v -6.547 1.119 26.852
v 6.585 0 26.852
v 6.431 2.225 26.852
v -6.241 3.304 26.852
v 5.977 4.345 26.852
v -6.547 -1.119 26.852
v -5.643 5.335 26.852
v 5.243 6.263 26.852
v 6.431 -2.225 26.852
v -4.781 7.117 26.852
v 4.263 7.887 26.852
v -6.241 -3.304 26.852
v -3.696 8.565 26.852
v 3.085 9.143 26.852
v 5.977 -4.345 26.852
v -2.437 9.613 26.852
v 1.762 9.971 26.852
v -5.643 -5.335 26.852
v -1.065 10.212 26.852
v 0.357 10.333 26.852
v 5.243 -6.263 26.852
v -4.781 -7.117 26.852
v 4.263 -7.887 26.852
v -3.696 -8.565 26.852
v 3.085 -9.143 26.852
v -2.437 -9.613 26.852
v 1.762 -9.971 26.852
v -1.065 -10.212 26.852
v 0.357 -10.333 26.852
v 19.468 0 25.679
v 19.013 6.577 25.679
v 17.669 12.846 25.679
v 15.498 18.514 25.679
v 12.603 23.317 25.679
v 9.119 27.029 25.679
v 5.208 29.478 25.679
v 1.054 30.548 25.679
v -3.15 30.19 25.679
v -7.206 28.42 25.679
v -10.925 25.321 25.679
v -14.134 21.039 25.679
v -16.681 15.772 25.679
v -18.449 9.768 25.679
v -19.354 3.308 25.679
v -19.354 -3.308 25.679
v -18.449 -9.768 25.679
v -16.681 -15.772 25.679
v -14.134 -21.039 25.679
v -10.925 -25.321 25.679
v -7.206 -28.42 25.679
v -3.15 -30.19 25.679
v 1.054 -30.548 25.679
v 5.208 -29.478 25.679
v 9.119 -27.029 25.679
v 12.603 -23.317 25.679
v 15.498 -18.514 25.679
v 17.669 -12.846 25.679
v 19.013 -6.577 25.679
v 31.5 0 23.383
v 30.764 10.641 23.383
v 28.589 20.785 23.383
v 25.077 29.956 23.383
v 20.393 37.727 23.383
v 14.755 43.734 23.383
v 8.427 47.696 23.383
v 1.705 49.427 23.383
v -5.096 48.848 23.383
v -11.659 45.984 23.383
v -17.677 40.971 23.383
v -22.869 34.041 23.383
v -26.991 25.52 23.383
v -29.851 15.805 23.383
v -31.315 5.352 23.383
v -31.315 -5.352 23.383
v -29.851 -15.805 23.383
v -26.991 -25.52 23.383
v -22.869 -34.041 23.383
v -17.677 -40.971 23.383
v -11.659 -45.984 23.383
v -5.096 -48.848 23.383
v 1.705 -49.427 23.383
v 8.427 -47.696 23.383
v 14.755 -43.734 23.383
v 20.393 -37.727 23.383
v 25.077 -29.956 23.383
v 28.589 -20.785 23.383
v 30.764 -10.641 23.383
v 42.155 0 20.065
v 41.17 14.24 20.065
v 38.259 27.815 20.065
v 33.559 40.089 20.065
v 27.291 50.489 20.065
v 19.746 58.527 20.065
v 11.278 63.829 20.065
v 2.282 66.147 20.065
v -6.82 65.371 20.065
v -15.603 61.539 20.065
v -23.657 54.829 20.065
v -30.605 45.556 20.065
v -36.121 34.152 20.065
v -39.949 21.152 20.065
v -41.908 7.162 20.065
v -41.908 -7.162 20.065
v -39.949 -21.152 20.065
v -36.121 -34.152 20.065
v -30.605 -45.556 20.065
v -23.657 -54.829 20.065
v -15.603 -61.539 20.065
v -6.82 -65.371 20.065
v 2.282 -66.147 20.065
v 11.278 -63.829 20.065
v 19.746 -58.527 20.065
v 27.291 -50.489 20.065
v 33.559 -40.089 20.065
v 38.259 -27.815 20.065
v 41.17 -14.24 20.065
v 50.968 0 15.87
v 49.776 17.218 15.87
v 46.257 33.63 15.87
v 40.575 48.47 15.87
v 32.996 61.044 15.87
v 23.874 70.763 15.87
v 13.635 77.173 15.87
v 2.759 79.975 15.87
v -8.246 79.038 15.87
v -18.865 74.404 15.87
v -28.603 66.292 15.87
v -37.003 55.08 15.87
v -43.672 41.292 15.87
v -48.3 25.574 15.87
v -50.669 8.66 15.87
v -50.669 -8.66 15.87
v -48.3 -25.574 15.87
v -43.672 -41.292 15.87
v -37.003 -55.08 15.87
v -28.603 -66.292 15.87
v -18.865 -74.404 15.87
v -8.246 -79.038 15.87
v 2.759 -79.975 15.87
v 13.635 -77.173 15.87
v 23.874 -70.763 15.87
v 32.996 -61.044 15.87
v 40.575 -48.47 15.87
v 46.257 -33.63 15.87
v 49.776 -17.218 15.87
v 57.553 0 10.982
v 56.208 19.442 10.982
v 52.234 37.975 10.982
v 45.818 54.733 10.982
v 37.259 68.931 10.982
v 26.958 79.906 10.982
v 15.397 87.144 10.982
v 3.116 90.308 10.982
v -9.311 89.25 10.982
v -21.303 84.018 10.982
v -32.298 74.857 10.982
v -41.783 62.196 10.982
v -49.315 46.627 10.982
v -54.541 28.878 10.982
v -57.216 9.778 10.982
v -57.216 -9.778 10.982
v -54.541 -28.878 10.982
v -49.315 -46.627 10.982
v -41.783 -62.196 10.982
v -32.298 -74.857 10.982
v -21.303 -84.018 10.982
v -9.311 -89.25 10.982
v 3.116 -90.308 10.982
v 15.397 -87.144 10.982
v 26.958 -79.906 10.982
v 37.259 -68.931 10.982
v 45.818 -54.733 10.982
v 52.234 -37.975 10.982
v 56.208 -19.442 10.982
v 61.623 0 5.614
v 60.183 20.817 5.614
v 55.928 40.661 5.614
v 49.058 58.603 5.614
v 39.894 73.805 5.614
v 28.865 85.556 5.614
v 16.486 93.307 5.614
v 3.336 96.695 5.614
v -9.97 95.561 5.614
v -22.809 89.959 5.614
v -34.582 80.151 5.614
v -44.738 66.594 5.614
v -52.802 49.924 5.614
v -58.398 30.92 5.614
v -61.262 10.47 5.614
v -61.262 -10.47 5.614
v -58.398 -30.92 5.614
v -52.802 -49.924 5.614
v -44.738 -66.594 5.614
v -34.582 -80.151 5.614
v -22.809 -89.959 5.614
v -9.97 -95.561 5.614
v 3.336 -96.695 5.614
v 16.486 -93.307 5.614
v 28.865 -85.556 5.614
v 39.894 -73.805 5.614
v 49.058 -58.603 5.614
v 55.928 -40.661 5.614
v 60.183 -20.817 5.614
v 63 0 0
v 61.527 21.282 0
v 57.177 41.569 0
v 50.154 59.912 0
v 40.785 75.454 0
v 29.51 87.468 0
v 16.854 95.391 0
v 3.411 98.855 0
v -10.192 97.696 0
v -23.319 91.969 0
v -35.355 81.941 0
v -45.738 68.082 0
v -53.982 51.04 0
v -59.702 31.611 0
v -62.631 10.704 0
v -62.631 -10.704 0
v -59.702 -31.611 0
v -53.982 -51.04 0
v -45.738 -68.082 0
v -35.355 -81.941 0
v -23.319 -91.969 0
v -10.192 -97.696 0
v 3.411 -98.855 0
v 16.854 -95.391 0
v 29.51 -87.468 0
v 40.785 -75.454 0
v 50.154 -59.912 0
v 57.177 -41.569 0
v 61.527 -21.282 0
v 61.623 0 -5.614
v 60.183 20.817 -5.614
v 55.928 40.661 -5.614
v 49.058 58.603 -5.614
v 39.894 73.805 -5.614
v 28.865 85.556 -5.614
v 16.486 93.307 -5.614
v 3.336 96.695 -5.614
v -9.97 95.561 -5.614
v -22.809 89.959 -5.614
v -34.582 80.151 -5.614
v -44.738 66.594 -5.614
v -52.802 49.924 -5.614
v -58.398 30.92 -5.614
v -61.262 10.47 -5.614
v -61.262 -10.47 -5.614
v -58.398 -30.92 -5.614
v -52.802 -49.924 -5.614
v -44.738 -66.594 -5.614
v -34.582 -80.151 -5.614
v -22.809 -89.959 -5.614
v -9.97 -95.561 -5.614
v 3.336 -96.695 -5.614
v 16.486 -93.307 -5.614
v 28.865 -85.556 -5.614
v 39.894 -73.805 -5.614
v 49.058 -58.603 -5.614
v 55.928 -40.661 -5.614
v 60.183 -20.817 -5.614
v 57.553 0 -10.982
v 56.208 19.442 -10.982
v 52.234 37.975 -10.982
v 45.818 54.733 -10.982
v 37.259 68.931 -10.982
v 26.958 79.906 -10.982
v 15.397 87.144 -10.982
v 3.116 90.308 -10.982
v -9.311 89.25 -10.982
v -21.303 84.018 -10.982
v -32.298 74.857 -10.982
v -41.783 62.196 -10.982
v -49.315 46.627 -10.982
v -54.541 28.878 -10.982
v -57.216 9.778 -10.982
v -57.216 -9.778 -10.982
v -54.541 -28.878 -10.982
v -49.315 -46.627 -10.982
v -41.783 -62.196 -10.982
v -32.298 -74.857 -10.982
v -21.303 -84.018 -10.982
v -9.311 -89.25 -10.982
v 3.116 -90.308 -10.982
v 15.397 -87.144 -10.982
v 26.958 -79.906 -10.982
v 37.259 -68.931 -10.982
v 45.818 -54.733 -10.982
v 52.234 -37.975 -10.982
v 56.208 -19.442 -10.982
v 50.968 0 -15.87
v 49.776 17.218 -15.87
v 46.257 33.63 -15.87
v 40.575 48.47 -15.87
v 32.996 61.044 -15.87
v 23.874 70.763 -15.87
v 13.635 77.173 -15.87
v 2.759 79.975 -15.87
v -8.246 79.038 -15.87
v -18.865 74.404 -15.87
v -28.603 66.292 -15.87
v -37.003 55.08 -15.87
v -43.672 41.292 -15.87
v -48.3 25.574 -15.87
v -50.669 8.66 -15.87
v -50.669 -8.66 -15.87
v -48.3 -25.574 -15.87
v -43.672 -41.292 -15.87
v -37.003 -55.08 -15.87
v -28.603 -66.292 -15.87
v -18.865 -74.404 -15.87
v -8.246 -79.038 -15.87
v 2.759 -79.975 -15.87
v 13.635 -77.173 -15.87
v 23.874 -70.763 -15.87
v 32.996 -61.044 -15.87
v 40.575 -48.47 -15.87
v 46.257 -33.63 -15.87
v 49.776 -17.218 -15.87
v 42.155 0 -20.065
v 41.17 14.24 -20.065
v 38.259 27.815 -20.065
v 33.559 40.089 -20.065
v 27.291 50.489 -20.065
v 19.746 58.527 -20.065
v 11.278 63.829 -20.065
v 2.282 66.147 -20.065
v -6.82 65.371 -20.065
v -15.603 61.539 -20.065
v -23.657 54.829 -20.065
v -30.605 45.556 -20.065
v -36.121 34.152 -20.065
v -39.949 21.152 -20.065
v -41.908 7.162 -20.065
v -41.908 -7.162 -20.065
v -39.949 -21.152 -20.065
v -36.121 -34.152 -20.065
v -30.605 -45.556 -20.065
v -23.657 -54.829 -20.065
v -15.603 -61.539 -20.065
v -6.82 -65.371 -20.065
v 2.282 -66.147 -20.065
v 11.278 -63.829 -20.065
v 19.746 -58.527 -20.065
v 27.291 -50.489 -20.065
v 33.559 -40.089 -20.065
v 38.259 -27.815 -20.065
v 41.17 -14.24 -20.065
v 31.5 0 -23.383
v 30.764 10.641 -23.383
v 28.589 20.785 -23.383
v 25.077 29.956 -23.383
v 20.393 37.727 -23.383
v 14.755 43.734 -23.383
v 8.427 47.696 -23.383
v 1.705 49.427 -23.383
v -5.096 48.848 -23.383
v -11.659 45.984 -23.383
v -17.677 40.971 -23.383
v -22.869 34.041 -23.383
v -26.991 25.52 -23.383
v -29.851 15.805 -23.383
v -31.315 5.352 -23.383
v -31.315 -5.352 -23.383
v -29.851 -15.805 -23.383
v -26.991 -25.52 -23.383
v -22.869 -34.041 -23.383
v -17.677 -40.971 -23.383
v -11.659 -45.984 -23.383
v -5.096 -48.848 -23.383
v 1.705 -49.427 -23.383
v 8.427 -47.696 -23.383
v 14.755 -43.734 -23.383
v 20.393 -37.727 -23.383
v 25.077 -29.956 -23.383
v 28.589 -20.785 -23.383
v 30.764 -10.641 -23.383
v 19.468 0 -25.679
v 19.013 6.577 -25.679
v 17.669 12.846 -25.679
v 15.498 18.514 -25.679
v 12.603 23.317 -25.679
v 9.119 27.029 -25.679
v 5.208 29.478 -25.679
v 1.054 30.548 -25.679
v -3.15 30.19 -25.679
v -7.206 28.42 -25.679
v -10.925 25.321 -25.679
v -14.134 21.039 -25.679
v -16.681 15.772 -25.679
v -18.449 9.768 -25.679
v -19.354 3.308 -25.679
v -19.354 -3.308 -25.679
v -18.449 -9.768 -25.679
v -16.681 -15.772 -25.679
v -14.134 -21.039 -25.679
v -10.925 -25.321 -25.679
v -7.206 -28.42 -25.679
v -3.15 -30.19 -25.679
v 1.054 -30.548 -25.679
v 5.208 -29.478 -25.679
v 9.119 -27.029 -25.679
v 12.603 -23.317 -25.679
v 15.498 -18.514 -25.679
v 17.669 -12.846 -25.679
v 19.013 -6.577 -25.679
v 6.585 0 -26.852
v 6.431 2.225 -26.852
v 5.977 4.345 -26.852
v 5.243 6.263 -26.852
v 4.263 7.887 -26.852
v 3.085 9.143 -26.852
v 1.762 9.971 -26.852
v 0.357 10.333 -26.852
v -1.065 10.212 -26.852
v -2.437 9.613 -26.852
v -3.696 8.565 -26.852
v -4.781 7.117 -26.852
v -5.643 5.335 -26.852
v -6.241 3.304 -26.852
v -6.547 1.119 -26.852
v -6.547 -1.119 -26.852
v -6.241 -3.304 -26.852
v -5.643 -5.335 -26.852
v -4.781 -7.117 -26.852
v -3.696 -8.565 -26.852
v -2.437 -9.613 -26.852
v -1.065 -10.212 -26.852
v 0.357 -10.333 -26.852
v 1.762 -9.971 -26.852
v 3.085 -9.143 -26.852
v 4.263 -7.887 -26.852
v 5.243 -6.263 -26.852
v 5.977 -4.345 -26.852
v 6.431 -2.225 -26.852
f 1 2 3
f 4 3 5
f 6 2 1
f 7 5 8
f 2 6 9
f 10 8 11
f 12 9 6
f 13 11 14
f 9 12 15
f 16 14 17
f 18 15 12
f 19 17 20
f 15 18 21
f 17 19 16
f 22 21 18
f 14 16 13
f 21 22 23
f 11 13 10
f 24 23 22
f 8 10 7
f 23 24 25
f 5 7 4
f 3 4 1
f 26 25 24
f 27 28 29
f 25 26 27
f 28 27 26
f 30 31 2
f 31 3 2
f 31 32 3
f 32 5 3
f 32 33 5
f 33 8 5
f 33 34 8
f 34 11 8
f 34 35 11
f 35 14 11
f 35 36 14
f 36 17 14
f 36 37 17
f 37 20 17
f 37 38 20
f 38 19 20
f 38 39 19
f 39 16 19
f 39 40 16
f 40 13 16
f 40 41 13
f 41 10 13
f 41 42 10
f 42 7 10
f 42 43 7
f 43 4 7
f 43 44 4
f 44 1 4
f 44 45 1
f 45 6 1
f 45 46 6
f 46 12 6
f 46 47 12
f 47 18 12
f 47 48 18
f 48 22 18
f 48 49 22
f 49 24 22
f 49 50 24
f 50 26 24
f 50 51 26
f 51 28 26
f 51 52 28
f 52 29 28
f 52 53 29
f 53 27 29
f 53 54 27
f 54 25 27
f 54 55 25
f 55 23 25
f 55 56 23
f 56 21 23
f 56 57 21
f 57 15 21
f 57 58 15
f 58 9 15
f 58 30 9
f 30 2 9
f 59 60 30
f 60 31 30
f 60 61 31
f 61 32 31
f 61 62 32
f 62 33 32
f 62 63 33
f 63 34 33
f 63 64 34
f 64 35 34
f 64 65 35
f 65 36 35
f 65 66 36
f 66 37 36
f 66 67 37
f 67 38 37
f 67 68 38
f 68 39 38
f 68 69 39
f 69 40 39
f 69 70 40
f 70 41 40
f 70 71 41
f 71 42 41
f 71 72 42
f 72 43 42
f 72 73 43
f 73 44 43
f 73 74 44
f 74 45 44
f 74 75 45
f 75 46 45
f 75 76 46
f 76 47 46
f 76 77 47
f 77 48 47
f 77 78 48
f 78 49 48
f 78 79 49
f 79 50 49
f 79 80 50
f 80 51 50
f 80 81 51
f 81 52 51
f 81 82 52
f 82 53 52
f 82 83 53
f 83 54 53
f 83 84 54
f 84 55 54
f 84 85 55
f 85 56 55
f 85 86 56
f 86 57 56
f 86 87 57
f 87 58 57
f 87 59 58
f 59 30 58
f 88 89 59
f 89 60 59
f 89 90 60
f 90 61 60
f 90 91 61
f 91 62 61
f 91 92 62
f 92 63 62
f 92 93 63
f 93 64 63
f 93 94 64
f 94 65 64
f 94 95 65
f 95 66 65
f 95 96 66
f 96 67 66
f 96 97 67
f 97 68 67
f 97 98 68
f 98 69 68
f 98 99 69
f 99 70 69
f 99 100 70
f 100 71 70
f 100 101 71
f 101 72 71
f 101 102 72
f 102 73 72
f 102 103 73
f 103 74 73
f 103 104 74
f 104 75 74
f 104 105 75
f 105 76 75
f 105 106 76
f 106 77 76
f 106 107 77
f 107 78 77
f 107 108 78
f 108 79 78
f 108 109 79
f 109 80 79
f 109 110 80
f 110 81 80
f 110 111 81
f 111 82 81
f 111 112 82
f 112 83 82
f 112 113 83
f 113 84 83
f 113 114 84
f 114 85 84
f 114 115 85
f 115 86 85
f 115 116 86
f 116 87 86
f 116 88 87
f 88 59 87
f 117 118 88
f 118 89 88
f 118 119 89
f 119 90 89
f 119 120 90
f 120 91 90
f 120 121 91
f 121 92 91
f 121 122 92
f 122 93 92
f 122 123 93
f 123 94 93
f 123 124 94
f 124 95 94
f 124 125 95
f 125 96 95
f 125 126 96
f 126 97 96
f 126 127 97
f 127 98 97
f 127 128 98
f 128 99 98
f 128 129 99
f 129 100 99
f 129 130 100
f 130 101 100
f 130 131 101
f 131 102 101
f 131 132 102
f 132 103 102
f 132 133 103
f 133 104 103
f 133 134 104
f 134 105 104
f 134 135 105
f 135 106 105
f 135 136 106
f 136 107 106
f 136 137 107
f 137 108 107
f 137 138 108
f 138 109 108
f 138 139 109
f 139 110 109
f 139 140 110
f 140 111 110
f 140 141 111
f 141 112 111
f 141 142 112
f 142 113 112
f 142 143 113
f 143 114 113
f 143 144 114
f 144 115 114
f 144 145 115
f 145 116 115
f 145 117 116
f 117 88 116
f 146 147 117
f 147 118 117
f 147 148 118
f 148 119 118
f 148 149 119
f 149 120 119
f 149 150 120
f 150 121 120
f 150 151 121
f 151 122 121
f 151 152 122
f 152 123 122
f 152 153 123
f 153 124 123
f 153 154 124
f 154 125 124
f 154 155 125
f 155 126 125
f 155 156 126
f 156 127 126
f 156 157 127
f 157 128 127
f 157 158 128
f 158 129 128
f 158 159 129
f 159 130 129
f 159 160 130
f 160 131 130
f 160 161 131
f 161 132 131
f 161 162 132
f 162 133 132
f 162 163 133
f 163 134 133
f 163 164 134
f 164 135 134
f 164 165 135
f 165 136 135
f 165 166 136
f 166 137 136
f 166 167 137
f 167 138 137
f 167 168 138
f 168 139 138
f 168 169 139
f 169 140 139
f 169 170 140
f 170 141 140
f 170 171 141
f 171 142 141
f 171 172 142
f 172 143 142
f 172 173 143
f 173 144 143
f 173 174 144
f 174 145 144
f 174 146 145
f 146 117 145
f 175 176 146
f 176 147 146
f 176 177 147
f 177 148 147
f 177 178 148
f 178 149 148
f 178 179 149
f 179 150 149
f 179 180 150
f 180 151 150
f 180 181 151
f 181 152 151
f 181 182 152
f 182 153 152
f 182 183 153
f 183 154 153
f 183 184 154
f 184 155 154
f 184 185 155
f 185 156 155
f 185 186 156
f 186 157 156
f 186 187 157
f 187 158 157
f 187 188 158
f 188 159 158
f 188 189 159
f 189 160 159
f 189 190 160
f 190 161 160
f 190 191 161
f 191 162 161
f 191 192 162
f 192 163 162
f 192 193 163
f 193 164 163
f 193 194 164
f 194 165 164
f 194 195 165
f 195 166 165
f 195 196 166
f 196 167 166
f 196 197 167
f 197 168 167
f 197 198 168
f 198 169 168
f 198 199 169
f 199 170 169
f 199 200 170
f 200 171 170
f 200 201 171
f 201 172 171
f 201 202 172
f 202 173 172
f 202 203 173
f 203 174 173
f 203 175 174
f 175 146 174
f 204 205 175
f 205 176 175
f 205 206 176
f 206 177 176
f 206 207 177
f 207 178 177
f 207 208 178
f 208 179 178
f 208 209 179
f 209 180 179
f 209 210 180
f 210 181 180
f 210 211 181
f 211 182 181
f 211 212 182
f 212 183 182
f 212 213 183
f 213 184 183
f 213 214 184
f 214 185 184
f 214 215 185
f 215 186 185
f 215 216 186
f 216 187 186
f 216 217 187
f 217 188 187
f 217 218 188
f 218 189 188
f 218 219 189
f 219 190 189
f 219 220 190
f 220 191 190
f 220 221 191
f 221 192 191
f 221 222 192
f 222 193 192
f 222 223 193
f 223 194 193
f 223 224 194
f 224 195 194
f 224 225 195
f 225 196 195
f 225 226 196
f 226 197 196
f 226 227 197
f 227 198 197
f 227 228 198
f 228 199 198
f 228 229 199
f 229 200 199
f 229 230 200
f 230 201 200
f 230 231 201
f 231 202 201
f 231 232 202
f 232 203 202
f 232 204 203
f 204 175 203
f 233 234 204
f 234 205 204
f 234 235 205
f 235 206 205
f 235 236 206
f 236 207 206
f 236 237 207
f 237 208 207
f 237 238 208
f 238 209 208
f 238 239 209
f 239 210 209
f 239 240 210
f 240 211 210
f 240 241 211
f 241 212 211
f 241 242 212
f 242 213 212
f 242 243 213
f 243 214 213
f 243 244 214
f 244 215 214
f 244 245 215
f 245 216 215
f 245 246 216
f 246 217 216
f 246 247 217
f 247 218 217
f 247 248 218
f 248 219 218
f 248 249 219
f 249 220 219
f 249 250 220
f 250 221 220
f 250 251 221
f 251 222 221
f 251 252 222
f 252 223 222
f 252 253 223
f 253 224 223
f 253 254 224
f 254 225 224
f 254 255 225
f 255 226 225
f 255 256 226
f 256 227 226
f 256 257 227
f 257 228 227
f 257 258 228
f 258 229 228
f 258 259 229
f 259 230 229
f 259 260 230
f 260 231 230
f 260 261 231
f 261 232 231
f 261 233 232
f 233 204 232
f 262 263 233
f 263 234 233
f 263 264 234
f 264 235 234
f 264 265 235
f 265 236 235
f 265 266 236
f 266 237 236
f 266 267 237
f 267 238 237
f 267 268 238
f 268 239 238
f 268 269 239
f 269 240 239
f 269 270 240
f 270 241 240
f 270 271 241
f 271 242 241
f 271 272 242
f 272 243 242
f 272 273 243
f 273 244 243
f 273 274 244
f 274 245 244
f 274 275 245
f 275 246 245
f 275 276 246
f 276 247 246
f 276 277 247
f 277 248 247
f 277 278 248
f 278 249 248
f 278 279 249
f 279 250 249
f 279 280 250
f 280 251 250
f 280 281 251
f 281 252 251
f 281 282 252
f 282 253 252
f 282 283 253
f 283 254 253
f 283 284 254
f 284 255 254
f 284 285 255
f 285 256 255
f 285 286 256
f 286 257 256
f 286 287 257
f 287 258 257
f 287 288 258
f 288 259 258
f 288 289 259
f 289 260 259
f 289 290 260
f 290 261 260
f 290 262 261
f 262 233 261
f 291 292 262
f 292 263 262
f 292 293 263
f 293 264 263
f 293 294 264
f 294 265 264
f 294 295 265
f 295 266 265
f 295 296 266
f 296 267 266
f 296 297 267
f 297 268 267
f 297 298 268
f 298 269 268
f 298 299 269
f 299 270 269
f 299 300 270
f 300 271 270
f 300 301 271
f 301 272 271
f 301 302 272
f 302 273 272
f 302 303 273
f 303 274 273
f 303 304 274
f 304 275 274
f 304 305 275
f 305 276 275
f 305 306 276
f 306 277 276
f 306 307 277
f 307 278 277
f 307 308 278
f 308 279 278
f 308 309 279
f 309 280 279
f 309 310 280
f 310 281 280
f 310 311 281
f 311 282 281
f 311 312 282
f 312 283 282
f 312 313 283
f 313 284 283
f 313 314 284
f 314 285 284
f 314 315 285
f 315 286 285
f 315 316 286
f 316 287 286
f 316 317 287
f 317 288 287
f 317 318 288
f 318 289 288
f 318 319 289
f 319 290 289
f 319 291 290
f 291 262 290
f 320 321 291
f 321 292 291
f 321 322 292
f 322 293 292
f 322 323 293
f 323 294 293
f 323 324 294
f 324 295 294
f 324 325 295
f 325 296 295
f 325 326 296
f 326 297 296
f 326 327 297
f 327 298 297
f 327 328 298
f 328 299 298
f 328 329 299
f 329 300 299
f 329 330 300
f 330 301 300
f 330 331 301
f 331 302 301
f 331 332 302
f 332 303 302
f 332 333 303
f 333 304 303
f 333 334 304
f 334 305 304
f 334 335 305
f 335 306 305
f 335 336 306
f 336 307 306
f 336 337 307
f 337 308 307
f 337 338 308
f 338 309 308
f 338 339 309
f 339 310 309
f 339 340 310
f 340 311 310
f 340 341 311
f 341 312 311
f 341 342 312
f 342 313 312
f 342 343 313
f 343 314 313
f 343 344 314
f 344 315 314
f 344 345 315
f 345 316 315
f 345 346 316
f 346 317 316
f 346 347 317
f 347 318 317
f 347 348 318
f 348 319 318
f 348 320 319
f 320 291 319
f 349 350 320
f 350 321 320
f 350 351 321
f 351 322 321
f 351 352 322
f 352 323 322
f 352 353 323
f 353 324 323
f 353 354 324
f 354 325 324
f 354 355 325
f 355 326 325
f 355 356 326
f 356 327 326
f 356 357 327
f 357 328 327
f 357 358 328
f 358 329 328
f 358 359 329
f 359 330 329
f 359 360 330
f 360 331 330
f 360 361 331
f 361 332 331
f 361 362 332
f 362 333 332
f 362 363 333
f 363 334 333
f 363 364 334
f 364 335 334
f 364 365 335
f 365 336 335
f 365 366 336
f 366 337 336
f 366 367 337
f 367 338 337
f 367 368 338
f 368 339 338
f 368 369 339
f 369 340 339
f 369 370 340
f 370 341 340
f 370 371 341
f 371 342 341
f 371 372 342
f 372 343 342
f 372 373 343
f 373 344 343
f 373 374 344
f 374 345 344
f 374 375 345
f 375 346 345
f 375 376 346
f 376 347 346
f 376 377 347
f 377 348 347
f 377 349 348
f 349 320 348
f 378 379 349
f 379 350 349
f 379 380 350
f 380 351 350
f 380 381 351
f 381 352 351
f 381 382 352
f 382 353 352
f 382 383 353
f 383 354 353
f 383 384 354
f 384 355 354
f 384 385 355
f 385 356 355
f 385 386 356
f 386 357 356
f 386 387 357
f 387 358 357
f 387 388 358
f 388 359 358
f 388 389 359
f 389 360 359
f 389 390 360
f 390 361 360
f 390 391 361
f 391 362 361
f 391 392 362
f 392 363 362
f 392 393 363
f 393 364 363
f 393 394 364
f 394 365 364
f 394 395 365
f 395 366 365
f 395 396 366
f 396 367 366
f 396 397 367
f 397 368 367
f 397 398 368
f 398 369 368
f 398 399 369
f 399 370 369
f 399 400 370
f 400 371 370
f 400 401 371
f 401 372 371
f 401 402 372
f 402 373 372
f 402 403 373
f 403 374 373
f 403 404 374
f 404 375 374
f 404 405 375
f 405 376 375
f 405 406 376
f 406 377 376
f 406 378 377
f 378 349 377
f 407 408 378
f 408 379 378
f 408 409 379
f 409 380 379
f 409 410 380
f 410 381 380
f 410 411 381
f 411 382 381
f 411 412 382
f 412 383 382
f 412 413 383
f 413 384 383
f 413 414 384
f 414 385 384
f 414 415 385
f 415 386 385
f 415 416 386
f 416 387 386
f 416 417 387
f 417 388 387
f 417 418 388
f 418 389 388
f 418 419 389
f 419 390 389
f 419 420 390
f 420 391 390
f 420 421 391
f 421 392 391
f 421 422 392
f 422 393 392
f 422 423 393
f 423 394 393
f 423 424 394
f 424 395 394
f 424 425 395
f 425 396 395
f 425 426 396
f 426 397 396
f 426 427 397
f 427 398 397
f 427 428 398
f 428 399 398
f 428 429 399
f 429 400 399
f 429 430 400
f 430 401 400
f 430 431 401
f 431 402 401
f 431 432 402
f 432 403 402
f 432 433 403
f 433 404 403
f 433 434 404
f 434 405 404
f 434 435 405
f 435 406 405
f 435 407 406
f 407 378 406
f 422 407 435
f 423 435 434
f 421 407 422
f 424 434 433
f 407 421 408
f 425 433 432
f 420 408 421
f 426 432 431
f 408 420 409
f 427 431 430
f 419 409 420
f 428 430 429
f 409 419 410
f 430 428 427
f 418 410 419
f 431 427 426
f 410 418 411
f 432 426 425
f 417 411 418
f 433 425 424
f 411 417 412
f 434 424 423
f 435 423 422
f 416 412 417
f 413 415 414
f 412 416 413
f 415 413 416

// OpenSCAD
// Generated by SolidPython 1.0.1 on 2020-07-29 00:46:47


scale(v = [7, 11, 3]) {
	sphere(r = 9);
}
/***********************************************
*********      SolidPython code:      **********
************************************************
 
# import packages: SolidPython
from solid import *
from solid.utils import *
from itertools import chain, combinations, permutations


class Resize:

    def __init__(self, scad_file):
        self.scad_file = scad_file
        #self.scad_file = import_scad(scad_file)
        # cone/cylinder param:
        self.r1 = 0
        self.r2 = 0
        self.h = 0
        # rectangular prism param:
        self.w = 0
        self.l = 0
        # ellipse param:
        self.r = 0

    # import OpenScad code (file name corresponds to shape)


    # classify shape + parameters
    def assign(self, param1, param2, param3):
        if self.scad_file == 'cone.scad':
            self.r1 = param1
            self.r2 = param2
            self.h = param3
        elif self.scad_file == 'cylinder.scad':
            self.r1 = param1
            self.r2 = param2
            self.h = param3
        elif self.scad_file == 'rectangularPrism.scad':
            self.h = param1
            self.l = param2
            self.w = param3
        else:
            self.r = param1
            self.h = param2

    # resize parameters
    def iterate(self):
        x = range(3, 20, 2)
        i = 1
        if self.scad_file == 'cone.scad':
            tempList = list(permutations(x, 2))
            for temp in tempList:
                param1 = temp[0]
                param2 = temp[1]
                filepath = 'produced_scad_files/' + 'cone' + str(param1) + '_' + str(param2) + '_' + '.scad'
                scad_render_to_file(cylinder(h=param1, r1=param2, r2=0), filepath)

        elif self.scad_file == 'cylinder.scad':
            tempList = list(permutations(x, 3))
            for temp in tempList:
                param1 = temp[0]
                param2 = temp[1]
                filepath = 'produced_scad_files/' + 'cylinder' + str(param1) + '_' + str(param2) + '_' + '.scad'
                scad_render_to_file(cylinder(h=param1, r1=param2, r2=param2), filepath)

        elif self.scad_file == 'rectangularPrism.scad':
            tempList = list(permutations(x, 3))
            for temp in tempList:
                param1 = temp[0]
                param2 = temp[1]
                param3 = temp[2]
                filepath = 'produced_scad_files/' + 'rectangularPrism' + str(param1) + '_' + str(param2) + '_' + str(
                    param3) + '.scad'
                scad_render_to_file(cube(size=(param1, param2, param3)), filepath)

        elif self.scad_file == 'ellipse.scad':
            tempList = list(permutations(x, 4))
            for temp in tempList:
                param1 = temp[0]
                param2 = temp[1]
                param3 = temp[2]
                param4 = temp[3]
                filepath = 'produced_scad_files/' + 'ellipse' + str(param1) + '_' + str(param2) + '_' + str(param3) + '_' + str(param4) + '.scad'
                scad_render_to_file(scale([param1, param2, param3])(sphere(r=param4)), filepath)

    def render_to_scadfile(self):
        scad_render_to_file(scad, 'example.scad') 
 
************************************************/
